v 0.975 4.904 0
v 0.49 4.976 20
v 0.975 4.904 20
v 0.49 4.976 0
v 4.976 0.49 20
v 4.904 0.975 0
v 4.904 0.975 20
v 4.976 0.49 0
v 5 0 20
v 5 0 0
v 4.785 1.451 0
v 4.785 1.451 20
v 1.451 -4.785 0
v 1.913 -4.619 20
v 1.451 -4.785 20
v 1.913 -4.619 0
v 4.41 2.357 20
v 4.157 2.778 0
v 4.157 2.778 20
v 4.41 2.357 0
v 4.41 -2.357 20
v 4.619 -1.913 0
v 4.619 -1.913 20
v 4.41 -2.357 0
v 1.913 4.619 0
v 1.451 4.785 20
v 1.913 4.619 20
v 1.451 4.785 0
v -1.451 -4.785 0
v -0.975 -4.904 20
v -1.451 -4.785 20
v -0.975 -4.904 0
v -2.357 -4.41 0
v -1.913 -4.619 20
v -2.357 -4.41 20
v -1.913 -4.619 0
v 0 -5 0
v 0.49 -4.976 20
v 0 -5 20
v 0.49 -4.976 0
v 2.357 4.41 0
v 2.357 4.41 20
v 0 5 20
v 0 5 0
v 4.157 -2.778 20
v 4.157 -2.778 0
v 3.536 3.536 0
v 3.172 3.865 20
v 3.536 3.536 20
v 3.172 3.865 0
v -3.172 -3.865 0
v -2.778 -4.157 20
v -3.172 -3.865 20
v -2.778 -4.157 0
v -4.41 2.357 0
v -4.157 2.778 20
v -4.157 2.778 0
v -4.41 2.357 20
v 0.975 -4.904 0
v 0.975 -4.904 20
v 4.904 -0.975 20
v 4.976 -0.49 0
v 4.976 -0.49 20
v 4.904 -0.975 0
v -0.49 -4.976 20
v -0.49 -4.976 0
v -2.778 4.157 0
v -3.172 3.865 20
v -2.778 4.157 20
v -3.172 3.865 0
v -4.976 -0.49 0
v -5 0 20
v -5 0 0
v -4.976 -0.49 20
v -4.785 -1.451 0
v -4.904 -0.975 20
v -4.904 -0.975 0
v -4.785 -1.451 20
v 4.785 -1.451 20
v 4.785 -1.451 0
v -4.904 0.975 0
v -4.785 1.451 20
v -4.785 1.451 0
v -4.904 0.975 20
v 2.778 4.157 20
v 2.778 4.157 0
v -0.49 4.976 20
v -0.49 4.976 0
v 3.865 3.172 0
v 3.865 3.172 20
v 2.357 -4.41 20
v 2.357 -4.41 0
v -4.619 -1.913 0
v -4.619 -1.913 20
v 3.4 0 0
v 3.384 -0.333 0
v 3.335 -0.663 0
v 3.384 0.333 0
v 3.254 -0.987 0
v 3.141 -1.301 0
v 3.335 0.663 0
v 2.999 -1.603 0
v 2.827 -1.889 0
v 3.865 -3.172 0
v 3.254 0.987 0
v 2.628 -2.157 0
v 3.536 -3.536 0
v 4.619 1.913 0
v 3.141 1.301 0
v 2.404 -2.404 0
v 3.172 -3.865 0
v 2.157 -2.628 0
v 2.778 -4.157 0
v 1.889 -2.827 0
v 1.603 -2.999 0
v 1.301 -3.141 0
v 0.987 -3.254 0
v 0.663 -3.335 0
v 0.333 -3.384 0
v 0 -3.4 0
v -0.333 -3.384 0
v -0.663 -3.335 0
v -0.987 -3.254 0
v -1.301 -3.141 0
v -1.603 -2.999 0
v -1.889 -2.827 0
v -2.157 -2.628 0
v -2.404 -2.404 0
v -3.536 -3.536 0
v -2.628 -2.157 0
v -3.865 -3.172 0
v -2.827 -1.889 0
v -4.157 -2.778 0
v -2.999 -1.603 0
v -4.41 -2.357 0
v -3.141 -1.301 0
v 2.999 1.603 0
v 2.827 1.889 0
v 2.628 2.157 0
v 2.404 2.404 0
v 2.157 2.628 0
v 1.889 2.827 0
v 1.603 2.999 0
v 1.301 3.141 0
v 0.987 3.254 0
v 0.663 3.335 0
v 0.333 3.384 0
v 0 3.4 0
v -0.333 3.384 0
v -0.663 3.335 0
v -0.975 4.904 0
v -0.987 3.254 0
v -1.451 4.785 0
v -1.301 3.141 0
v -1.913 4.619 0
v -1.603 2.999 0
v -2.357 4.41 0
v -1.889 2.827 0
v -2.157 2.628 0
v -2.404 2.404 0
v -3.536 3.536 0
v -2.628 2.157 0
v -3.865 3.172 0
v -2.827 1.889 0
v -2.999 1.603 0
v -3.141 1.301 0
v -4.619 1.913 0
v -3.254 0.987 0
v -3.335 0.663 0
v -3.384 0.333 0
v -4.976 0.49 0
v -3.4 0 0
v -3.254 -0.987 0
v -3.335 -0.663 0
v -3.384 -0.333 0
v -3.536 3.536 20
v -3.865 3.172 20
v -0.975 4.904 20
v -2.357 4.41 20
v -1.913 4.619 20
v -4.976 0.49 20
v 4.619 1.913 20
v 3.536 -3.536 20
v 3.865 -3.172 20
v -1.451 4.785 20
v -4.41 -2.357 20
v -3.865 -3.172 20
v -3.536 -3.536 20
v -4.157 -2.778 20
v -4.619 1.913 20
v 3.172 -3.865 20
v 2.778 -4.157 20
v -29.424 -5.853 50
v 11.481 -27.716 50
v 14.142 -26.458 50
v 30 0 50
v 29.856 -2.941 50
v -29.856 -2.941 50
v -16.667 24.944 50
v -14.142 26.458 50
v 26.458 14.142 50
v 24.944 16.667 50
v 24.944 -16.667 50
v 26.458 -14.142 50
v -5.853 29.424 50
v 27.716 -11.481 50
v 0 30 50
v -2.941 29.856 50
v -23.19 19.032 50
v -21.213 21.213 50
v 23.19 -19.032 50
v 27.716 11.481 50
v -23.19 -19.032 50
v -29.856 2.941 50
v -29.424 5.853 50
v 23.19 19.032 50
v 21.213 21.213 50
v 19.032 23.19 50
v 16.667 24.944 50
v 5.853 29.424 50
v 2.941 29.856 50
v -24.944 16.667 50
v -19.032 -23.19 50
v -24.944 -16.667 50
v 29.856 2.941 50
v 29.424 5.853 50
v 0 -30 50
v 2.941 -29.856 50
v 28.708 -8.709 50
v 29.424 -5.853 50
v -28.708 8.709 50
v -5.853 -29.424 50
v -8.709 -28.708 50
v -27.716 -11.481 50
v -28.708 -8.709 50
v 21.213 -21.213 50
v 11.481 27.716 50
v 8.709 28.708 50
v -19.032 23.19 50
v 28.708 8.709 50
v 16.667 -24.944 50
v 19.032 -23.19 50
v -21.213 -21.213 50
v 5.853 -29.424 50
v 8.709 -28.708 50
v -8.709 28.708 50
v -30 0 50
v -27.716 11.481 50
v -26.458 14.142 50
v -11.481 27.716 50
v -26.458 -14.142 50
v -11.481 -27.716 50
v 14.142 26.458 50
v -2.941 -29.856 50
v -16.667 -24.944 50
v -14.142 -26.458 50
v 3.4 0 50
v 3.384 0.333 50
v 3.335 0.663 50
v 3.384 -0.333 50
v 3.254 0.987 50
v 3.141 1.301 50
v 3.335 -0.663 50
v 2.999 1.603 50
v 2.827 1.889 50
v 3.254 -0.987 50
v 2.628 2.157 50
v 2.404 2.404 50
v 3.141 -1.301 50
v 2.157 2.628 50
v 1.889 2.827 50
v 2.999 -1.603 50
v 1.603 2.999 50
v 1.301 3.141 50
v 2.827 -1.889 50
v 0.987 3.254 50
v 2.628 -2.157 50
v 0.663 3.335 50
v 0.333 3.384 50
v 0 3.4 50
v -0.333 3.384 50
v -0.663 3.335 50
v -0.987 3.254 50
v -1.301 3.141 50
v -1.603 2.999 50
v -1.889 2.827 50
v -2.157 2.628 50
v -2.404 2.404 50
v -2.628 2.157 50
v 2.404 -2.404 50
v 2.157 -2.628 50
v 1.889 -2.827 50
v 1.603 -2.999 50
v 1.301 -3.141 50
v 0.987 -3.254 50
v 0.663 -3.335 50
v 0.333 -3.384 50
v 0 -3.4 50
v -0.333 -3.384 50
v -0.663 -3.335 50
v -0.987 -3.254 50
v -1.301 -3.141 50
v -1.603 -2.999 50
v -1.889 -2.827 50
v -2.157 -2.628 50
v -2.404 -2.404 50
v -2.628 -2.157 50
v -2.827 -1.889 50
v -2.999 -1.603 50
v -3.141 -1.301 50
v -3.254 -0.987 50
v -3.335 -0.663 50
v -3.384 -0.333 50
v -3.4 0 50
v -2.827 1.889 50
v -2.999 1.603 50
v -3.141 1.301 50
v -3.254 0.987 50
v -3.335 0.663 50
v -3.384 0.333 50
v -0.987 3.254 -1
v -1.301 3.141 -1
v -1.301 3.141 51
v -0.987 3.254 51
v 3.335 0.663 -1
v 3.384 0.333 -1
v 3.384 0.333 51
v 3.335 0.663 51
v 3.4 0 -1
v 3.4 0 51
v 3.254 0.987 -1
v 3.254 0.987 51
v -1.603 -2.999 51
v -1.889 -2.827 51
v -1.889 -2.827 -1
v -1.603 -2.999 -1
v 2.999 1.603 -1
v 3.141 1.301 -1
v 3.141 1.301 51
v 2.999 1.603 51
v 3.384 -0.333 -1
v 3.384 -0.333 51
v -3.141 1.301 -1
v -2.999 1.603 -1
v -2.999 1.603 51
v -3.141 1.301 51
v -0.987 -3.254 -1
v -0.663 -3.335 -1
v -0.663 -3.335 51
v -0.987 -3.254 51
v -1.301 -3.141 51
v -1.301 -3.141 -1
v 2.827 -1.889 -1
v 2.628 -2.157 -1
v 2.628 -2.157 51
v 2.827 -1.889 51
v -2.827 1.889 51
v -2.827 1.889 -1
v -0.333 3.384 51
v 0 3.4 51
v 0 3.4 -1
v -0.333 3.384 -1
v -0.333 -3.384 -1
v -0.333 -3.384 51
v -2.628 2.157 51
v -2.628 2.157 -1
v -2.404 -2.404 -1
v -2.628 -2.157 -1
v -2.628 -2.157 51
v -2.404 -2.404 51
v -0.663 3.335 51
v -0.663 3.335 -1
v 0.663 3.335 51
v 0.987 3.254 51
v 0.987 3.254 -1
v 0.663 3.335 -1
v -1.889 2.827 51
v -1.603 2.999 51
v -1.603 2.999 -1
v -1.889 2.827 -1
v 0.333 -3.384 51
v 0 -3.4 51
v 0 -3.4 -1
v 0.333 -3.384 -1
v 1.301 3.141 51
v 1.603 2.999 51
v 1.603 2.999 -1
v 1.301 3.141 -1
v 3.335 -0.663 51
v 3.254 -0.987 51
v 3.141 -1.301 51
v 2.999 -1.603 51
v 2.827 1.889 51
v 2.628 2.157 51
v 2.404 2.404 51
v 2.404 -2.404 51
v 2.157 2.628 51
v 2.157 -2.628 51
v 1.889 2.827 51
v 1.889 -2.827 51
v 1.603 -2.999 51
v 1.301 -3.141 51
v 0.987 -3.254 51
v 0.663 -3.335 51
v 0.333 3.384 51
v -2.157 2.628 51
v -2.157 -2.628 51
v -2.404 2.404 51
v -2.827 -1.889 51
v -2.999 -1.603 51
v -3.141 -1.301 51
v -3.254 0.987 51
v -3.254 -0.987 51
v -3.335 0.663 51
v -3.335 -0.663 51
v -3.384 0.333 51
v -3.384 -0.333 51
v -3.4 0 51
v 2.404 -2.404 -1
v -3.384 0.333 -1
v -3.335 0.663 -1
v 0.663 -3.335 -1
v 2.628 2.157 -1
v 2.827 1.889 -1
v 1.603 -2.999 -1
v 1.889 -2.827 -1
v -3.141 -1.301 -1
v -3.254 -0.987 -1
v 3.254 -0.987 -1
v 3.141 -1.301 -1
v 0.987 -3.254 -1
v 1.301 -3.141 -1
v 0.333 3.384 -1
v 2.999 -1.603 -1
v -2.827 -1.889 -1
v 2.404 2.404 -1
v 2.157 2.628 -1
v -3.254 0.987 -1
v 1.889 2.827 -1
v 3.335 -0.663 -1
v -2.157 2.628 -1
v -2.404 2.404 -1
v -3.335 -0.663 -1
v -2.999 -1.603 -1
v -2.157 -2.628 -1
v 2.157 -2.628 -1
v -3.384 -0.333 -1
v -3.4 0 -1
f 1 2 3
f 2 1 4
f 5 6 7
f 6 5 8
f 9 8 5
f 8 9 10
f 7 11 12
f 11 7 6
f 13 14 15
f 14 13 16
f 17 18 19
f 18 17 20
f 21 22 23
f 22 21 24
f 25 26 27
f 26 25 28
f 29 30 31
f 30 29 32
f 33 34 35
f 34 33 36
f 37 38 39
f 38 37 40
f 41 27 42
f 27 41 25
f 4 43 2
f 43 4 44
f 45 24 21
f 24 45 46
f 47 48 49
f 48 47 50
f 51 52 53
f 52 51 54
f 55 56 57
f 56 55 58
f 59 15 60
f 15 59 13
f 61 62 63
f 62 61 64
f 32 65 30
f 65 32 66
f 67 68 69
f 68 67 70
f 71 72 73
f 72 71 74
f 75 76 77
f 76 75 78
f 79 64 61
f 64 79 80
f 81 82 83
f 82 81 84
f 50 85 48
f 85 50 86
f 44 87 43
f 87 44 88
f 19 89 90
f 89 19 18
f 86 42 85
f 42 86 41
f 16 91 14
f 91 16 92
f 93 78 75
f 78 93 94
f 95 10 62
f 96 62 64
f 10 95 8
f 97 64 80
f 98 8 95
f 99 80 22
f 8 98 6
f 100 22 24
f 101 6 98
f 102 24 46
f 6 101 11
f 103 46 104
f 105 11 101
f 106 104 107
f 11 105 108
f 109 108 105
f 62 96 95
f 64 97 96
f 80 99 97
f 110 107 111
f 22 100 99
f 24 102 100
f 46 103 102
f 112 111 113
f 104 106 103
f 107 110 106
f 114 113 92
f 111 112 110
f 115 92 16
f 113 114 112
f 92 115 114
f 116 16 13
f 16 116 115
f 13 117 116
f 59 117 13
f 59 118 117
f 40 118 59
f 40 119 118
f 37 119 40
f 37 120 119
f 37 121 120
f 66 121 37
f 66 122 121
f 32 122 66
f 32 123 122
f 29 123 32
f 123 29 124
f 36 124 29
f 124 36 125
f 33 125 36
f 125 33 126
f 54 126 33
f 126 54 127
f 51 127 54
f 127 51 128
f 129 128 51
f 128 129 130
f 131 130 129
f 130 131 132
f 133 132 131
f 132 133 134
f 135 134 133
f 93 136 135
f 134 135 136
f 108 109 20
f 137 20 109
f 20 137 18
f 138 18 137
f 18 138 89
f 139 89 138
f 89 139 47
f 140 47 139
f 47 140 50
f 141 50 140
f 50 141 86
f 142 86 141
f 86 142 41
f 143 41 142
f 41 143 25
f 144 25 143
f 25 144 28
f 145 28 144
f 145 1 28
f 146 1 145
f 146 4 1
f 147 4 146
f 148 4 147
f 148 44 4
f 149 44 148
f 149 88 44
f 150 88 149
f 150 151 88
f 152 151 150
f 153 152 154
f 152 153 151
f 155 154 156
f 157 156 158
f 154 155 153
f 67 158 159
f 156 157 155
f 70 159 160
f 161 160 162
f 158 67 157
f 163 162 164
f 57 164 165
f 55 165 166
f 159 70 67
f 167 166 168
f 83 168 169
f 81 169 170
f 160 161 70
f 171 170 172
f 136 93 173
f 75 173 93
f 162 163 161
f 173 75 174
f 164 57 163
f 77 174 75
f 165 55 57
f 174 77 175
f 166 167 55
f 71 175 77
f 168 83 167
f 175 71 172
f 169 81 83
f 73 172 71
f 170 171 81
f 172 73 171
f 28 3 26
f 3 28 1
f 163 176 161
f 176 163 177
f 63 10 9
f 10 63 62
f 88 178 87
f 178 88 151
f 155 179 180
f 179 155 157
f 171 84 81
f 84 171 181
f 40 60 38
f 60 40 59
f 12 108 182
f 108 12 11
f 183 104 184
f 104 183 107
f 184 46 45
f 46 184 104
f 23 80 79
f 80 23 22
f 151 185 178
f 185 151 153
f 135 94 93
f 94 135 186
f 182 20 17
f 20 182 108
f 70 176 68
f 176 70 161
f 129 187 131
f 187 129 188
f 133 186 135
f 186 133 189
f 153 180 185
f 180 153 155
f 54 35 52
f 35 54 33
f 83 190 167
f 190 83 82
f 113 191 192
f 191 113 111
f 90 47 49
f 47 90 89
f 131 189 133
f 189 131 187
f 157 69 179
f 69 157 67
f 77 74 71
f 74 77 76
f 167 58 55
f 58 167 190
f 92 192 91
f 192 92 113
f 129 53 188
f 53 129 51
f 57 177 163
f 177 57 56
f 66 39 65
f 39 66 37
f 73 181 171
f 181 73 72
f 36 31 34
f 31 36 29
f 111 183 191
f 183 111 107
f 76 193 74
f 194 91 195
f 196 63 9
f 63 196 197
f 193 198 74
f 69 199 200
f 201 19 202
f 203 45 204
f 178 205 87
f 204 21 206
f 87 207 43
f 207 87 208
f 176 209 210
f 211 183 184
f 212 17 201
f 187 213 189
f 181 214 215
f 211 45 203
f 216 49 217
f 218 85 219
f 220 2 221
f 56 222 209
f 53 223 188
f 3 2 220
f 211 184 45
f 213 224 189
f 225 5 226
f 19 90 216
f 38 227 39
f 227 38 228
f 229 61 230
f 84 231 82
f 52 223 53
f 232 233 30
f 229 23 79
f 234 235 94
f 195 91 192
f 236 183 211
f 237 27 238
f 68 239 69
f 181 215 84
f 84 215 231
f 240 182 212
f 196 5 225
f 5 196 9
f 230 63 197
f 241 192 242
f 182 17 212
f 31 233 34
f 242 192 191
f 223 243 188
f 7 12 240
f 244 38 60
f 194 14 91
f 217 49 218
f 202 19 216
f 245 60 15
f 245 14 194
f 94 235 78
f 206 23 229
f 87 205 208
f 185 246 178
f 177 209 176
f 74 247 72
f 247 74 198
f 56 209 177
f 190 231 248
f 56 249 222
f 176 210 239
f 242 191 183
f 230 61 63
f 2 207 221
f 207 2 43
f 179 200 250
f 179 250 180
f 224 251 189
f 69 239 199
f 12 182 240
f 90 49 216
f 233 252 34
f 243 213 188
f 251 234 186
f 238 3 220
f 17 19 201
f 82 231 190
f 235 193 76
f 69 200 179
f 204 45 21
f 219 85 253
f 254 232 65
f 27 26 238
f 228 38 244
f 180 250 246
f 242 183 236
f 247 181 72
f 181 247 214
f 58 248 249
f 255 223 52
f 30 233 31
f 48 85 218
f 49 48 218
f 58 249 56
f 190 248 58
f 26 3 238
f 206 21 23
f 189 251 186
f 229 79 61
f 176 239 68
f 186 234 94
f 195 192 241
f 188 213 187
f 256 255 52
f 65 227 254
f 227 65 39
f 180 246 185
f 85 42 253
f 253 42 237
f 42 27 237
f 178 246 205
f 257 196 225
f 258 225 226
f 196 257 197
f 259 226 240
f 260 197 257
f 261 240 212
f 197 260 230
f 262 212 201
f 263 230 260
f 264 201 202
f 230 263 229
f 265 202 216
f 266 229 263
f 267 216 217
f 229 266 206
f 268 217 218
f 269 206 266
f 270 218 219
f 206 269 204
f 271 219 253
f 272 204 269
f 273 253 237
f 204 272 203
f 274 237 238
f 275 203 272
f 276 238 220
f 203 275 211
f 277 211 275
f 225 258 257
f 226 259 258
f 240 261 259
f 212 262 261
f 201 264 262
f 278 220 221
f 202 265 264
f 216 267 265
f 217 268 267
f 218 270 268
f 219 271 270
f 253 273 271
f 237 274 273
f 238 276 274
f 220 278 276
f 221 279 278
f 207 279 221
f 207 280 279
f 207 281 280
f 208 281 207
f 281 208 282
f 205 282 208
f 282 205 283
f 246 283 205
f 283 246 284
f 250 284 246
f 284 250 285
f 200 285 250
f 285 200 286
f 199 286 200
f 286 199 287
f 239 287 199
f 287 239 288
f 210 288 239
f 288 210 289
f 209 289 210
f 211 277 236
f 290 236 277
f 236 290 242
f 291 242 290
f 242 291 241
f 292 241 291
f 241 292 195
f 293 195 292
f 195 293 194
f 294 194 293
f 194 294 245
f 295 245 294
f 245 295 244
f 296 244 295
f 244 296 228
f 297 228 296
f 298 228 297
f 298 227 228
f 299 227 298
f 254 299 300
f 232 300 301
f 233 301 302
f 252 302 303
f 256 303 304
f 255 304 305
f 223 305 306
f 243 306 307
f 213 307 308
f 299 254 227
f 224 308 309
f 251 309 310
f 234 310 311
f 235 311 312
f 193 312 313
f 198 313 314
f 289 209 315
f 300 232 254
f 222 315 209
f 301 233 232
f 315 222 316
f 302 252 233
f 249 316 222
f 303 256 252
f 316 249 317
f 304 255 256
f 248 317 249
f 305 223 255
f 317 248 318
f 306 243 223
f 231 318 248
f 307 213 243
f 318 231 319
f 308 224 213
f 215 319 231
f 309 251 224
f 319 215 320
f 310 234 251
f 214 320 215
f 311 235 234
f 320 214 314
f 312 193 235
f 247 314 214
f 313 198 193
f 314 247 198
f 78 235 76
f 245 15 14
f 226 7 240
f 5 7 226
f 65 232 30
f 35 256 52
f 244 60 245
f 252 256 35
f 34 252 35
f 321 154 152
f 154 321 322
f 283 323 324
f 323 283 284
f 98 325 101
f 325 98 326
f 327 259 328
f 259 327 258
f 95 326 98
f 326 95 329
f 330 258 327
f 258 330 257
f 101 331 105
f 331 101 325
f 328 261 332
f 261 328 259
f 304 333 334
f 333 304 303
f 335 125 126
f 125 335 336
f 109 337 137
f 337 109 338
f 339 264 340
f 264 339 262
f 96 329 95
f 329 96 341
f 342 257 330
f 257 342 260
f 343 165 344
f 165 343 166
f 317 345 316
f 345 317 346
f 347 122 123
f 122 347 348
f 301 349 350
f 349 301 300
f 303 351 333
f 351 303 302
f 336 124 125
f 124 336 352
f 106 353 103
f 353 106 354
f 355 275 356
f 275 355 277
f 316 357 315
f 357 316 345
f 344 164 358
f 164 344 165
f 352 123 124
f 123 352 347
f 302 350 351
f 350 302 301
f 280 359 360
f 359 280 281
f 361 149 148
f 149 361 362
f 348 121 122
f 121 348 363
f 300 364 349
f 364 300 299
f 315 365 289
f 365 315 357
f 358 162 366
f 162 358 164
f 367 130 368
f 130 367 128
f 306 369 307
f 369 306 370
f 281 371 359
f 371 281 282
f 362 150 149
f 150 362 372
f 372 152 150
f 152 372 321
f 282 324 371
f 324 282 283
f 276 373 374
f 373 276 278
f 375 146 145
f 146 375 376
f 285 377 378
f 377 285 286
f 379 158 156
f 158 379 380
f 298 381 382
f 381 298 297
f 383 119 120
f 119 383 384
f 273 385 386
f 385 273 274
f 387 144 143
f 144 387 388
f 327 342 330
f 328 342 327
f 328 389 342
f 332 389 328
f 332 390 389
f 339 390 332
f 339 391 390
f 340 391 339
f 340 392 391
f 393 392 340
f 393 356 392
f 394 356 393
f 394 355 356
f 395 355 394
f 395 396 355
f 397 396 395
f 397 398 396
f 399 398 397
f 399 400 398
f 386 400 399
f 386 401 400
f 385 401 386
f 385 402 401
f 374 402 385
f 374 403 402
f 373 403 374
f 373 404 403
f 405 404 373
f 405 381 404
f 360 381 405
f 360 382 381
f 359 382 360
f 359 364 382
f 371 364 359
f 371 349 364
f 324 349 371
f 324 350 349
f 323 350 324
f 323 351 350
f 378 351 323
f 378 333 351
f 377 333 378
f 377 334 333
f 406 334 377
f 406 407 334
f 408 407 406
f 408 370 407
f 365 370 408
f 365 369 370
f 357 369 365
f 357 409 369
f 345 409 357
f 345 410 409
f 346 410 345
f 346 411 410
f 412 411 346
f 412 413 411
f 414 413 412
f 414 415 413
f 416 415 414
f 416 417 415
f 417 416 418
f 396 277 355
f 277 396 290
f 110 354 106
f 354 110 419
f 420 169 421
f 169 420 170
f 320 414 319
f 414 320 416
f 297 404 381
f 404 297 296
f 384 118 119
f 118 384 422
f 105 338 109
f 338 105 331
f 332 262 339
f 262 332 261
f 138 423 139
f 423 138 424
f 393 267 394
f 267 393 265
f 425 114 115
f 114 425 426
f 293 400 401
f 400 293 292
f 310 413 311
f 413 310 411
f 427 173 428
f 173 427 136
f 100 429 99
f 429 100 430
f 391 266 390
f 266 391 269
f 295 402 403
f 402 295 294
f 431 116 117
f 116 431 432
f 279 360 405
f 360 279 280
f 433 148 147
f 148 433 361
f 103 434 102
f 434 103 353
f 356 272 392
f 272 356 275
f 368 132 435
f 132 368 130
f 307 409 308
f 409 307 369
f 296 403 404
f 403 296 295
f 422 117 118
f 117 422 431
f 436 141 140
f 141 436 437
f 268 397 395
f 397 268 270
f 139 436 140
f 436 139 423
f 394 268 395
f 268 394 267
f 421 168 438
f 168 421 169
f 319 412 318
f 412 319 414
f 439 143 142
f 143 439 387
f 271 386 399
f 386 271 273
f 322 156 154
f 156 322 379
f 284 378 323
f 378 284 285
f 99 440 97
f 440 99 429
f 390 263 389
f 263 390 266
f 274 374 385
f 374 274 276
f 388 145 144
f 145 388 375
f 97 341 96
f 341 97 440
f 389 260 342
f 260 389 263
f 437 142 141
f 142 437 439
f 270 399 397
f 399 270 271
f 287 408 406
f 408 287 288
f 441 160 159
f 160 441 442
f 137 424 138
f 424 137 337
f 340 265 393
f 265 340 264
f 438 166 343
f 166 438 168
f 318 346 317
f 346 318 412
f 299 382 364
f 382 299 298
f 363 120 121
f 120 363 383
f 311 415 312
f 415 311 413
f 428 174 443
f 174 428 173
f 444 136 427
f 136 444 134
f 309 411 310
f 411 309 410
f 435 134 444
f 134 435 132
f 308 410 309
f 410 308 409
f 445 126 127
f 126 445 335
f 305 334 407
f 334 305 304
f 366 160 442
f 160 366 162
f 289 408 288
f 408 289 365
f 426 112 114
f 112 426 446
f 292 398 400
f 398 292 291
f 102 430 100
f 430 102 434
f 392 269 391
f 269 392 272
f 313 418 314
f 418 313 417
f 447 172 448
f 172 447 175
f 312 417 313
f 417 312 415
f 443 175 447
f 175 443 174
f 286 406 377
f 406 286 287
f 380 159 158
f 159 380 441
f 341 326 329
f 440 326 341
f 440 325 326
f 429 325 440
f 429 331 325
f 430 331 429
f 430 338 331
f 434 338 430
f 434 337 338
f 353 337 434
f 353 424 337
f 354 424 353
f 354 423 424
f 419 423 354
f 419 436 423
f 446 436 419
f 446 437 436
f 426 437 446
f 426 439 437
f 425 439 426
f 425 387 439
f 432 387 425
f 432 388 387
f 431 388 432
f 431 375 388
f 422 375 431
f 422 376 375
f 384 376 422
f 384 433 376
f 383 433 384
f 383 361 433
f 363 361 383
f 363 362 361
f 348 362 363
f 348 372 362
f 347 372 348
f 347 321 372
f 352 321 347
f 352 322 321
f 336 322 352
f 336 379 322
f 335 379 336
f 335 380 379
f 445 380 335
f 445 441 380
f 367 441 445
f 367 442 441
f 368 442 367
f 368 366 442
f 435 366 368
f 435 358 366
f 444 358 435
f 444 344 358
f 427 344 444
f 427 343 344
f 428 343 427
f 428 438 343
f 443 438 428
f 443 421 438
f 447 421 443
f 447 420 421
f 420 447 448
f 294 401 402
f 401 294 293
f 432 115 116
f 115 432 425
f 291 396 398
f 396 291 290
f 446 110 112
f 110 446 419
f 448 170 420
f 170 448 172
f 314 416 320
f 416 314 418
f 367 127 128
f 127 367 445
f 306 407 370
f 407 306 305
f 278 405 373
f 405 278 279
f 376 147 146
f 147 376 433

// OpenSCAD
// Lab funnel - printed upright, open at top and bottom
// Units: mm

$fn = 64;

// --- Dimensions ---
spout_od      = 10;   // spout outer diameter
spout_h       = 20;   // spout height (z = 0 to 20)
cone_od_top   = 60;   // cone rim outer diameter (z = 50)
cone_h        = 30;   // cone height (z = 20 to 50)
wall          = 1.6;  // wall thickness everywhere

// --- Derived ---
spout_id      = spout_od - 2 * wall;   // bore diameter
cone_od_bot   = spout_od;             // cone starts at spout diameter

// --- Model ---
union() {
    // Straight spout (tube)
    translate([0, 0, 0])
        cylinder(d = spout_od, h = spout_h);

    // Cone: od = cone_od_bot at z = spout_h, od = cone_od_top at z = spout_h + cone_h
    translate([0, 0, spout_h])
        cylinder(d1 = cone_od_bot, d2 = cone_od_top, h = cone_h);
}

// Cut the bore through the full height
translate([0, 0, -1])
    cylinder(d = spout_id, h = spout_h + cone_h + 2);
